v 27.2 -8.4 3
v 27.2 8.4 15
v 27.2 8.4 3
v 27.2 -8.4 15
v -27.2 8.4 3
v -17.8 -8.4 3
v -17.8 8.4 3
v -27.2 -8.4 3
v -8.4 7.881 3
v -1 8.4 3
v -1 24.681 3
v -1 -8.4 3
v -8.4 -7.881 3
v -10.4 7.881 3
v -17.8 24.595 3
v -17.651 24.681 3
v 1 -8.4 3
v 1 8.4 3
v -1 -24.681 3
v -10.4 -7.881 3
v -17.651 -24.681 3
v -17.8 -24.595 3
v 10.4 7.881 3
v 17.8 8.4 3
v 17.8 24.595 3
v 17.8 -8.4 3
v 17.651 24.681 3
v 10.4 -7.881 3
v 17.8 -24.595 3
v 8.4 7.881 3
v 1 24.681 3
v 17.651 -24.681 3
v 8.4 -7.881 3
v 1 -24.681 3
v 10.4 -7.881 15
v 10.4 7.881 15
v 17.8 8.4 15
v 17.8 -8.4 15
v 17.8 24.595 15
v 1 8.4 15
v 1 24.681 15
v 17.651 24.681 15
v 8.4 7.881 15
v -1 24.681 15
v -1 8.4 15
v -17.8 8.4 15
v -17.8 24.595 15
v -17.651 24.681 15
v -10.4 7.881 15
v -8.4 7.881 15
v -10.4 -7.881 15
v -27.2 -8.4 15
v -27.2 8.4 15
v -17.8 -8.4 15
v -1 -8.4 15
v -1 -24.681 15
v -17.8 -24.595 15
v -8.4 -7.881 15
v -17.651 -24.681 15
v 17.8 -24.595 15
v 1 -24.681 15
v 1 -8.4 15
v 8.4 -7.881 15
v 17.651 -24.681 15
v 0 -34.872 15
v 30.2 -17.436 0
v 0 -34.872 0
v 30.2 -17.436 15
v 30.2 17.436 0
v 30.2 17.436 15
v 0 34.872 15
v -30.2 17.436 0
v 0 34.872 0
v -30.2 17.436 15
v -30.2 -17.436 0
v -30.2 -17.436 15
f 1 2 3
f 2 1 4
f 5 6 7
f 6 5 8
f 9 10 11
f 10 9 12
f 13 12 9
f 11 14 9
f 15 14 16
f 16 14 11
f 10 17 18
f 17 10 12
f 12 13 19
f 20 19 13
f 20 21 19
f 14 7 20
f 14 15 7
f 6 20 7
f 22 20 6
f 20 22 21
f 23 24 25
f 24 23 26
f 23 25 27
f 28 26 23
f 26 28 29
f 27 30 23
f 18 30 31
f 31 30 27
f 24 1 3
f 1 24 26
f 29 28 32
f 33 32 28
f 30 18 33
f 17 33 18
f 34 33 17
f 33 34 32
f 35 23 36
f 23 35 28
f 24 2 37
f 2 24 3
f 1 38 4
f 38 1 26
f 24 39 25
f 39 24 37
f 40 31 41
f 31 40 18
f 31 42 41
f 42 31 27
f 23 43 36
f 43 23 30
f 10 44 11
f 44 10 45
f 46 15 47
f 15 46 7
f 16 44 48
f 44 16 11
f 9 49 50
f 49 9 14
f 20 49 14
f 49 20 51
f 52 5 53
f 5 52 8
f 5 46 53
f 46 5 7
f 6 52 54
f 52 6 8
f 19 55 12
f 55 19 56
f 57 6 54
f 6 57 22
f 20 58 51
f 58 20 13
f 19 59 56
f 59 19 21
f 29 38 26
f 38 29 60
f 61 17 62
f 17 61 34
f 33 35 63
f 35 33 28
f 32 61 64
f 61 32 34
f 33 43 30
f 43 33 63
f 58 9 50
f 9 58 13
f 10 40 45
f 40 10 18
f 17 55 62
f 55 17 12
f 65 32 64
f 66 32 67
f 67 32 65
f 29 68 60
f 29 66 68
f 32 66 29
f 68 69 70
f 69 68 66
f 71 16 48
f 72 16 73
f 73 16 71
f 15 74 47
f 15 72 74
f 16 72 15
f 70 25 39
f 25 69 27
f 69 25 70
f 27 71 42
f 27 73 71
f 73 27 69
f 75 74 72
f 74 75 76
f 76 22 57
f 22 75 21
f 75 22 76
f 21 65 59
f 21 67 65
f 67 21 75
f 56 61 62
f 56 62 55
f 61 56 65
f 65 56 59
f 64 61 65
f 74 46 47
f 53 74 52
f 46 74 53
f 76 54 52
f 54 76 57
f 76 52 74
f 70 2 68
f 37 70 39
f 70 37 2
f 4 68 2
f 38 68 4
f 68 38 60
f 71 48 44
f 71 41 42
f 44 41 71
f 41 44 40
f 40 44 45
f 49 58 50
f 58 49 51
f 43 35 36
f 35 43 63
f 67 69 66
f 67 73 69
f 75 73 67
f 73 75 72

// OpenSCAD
// --- PRECISION 7-DICE HEXAGONAL TRAY SPECIFICATIONS ---
die_size = 16.0;         // Size of the die from the previous model (mm)
tolerance = 0.8;        // Extra padding per slot for easy insertion/removal (mm)
wall_thickness = 3.0;   // Outer border and floor thickness (mm)
divider_width = 2.0;    // Structural mesh dividing individual slots (mm)
tray_depth = 12.0;      // Total depth of the cutout slots (mm)
$fn = 60;               // Resolution for rounded corners

// Derived spacing calculations based on hexagonal packing geometry
slot_w = die_size + tolerance;
row_spacing = slot_w + divider_width;
col_spacing = row_spacing * cos(30); // ~0.866025 structural layout offset

module single_die_slot() {
    // Sharp or slightly rounded square cutout pocket
    cube([slot_w, slot_w, tray_depth * 2], center = true);
}

module hexagonal_slot_layout() {
    // Center slot (Position 0,0)
    single_die_slot();
    
    // 6 Surrounding slots forming a perfect hexagon ring
    for (i = [0 : 5]) {
        angle = i * 60;
        translate([row_spacing * cos(angle), row_spacing * sin(angle), 0])
            single_die_slot();
    }
}

module precision_dice_tray() {
    // Calculate total boundary to dynamically size the outer perimeter
    outer_radius = row_spacing + (slot_w / 2) + wall_thickness;
    total_height = tray_depth + wall_thickness;
    
    difference() {
        // Base tray body - Hexagonal block matching the layout orientation
        rotate([0, 0, 30])
            cylinder(h = total_height, r = outer_radius / cos(30), $fn = 6);
        
        // Subtract the 7 slots shifted upwards to leave a solid floor layer
        translate([0, 0, wall_thickness + tray_depth])
            hexagonal_slot_layout();
    }
}

precision_dice_tray();
